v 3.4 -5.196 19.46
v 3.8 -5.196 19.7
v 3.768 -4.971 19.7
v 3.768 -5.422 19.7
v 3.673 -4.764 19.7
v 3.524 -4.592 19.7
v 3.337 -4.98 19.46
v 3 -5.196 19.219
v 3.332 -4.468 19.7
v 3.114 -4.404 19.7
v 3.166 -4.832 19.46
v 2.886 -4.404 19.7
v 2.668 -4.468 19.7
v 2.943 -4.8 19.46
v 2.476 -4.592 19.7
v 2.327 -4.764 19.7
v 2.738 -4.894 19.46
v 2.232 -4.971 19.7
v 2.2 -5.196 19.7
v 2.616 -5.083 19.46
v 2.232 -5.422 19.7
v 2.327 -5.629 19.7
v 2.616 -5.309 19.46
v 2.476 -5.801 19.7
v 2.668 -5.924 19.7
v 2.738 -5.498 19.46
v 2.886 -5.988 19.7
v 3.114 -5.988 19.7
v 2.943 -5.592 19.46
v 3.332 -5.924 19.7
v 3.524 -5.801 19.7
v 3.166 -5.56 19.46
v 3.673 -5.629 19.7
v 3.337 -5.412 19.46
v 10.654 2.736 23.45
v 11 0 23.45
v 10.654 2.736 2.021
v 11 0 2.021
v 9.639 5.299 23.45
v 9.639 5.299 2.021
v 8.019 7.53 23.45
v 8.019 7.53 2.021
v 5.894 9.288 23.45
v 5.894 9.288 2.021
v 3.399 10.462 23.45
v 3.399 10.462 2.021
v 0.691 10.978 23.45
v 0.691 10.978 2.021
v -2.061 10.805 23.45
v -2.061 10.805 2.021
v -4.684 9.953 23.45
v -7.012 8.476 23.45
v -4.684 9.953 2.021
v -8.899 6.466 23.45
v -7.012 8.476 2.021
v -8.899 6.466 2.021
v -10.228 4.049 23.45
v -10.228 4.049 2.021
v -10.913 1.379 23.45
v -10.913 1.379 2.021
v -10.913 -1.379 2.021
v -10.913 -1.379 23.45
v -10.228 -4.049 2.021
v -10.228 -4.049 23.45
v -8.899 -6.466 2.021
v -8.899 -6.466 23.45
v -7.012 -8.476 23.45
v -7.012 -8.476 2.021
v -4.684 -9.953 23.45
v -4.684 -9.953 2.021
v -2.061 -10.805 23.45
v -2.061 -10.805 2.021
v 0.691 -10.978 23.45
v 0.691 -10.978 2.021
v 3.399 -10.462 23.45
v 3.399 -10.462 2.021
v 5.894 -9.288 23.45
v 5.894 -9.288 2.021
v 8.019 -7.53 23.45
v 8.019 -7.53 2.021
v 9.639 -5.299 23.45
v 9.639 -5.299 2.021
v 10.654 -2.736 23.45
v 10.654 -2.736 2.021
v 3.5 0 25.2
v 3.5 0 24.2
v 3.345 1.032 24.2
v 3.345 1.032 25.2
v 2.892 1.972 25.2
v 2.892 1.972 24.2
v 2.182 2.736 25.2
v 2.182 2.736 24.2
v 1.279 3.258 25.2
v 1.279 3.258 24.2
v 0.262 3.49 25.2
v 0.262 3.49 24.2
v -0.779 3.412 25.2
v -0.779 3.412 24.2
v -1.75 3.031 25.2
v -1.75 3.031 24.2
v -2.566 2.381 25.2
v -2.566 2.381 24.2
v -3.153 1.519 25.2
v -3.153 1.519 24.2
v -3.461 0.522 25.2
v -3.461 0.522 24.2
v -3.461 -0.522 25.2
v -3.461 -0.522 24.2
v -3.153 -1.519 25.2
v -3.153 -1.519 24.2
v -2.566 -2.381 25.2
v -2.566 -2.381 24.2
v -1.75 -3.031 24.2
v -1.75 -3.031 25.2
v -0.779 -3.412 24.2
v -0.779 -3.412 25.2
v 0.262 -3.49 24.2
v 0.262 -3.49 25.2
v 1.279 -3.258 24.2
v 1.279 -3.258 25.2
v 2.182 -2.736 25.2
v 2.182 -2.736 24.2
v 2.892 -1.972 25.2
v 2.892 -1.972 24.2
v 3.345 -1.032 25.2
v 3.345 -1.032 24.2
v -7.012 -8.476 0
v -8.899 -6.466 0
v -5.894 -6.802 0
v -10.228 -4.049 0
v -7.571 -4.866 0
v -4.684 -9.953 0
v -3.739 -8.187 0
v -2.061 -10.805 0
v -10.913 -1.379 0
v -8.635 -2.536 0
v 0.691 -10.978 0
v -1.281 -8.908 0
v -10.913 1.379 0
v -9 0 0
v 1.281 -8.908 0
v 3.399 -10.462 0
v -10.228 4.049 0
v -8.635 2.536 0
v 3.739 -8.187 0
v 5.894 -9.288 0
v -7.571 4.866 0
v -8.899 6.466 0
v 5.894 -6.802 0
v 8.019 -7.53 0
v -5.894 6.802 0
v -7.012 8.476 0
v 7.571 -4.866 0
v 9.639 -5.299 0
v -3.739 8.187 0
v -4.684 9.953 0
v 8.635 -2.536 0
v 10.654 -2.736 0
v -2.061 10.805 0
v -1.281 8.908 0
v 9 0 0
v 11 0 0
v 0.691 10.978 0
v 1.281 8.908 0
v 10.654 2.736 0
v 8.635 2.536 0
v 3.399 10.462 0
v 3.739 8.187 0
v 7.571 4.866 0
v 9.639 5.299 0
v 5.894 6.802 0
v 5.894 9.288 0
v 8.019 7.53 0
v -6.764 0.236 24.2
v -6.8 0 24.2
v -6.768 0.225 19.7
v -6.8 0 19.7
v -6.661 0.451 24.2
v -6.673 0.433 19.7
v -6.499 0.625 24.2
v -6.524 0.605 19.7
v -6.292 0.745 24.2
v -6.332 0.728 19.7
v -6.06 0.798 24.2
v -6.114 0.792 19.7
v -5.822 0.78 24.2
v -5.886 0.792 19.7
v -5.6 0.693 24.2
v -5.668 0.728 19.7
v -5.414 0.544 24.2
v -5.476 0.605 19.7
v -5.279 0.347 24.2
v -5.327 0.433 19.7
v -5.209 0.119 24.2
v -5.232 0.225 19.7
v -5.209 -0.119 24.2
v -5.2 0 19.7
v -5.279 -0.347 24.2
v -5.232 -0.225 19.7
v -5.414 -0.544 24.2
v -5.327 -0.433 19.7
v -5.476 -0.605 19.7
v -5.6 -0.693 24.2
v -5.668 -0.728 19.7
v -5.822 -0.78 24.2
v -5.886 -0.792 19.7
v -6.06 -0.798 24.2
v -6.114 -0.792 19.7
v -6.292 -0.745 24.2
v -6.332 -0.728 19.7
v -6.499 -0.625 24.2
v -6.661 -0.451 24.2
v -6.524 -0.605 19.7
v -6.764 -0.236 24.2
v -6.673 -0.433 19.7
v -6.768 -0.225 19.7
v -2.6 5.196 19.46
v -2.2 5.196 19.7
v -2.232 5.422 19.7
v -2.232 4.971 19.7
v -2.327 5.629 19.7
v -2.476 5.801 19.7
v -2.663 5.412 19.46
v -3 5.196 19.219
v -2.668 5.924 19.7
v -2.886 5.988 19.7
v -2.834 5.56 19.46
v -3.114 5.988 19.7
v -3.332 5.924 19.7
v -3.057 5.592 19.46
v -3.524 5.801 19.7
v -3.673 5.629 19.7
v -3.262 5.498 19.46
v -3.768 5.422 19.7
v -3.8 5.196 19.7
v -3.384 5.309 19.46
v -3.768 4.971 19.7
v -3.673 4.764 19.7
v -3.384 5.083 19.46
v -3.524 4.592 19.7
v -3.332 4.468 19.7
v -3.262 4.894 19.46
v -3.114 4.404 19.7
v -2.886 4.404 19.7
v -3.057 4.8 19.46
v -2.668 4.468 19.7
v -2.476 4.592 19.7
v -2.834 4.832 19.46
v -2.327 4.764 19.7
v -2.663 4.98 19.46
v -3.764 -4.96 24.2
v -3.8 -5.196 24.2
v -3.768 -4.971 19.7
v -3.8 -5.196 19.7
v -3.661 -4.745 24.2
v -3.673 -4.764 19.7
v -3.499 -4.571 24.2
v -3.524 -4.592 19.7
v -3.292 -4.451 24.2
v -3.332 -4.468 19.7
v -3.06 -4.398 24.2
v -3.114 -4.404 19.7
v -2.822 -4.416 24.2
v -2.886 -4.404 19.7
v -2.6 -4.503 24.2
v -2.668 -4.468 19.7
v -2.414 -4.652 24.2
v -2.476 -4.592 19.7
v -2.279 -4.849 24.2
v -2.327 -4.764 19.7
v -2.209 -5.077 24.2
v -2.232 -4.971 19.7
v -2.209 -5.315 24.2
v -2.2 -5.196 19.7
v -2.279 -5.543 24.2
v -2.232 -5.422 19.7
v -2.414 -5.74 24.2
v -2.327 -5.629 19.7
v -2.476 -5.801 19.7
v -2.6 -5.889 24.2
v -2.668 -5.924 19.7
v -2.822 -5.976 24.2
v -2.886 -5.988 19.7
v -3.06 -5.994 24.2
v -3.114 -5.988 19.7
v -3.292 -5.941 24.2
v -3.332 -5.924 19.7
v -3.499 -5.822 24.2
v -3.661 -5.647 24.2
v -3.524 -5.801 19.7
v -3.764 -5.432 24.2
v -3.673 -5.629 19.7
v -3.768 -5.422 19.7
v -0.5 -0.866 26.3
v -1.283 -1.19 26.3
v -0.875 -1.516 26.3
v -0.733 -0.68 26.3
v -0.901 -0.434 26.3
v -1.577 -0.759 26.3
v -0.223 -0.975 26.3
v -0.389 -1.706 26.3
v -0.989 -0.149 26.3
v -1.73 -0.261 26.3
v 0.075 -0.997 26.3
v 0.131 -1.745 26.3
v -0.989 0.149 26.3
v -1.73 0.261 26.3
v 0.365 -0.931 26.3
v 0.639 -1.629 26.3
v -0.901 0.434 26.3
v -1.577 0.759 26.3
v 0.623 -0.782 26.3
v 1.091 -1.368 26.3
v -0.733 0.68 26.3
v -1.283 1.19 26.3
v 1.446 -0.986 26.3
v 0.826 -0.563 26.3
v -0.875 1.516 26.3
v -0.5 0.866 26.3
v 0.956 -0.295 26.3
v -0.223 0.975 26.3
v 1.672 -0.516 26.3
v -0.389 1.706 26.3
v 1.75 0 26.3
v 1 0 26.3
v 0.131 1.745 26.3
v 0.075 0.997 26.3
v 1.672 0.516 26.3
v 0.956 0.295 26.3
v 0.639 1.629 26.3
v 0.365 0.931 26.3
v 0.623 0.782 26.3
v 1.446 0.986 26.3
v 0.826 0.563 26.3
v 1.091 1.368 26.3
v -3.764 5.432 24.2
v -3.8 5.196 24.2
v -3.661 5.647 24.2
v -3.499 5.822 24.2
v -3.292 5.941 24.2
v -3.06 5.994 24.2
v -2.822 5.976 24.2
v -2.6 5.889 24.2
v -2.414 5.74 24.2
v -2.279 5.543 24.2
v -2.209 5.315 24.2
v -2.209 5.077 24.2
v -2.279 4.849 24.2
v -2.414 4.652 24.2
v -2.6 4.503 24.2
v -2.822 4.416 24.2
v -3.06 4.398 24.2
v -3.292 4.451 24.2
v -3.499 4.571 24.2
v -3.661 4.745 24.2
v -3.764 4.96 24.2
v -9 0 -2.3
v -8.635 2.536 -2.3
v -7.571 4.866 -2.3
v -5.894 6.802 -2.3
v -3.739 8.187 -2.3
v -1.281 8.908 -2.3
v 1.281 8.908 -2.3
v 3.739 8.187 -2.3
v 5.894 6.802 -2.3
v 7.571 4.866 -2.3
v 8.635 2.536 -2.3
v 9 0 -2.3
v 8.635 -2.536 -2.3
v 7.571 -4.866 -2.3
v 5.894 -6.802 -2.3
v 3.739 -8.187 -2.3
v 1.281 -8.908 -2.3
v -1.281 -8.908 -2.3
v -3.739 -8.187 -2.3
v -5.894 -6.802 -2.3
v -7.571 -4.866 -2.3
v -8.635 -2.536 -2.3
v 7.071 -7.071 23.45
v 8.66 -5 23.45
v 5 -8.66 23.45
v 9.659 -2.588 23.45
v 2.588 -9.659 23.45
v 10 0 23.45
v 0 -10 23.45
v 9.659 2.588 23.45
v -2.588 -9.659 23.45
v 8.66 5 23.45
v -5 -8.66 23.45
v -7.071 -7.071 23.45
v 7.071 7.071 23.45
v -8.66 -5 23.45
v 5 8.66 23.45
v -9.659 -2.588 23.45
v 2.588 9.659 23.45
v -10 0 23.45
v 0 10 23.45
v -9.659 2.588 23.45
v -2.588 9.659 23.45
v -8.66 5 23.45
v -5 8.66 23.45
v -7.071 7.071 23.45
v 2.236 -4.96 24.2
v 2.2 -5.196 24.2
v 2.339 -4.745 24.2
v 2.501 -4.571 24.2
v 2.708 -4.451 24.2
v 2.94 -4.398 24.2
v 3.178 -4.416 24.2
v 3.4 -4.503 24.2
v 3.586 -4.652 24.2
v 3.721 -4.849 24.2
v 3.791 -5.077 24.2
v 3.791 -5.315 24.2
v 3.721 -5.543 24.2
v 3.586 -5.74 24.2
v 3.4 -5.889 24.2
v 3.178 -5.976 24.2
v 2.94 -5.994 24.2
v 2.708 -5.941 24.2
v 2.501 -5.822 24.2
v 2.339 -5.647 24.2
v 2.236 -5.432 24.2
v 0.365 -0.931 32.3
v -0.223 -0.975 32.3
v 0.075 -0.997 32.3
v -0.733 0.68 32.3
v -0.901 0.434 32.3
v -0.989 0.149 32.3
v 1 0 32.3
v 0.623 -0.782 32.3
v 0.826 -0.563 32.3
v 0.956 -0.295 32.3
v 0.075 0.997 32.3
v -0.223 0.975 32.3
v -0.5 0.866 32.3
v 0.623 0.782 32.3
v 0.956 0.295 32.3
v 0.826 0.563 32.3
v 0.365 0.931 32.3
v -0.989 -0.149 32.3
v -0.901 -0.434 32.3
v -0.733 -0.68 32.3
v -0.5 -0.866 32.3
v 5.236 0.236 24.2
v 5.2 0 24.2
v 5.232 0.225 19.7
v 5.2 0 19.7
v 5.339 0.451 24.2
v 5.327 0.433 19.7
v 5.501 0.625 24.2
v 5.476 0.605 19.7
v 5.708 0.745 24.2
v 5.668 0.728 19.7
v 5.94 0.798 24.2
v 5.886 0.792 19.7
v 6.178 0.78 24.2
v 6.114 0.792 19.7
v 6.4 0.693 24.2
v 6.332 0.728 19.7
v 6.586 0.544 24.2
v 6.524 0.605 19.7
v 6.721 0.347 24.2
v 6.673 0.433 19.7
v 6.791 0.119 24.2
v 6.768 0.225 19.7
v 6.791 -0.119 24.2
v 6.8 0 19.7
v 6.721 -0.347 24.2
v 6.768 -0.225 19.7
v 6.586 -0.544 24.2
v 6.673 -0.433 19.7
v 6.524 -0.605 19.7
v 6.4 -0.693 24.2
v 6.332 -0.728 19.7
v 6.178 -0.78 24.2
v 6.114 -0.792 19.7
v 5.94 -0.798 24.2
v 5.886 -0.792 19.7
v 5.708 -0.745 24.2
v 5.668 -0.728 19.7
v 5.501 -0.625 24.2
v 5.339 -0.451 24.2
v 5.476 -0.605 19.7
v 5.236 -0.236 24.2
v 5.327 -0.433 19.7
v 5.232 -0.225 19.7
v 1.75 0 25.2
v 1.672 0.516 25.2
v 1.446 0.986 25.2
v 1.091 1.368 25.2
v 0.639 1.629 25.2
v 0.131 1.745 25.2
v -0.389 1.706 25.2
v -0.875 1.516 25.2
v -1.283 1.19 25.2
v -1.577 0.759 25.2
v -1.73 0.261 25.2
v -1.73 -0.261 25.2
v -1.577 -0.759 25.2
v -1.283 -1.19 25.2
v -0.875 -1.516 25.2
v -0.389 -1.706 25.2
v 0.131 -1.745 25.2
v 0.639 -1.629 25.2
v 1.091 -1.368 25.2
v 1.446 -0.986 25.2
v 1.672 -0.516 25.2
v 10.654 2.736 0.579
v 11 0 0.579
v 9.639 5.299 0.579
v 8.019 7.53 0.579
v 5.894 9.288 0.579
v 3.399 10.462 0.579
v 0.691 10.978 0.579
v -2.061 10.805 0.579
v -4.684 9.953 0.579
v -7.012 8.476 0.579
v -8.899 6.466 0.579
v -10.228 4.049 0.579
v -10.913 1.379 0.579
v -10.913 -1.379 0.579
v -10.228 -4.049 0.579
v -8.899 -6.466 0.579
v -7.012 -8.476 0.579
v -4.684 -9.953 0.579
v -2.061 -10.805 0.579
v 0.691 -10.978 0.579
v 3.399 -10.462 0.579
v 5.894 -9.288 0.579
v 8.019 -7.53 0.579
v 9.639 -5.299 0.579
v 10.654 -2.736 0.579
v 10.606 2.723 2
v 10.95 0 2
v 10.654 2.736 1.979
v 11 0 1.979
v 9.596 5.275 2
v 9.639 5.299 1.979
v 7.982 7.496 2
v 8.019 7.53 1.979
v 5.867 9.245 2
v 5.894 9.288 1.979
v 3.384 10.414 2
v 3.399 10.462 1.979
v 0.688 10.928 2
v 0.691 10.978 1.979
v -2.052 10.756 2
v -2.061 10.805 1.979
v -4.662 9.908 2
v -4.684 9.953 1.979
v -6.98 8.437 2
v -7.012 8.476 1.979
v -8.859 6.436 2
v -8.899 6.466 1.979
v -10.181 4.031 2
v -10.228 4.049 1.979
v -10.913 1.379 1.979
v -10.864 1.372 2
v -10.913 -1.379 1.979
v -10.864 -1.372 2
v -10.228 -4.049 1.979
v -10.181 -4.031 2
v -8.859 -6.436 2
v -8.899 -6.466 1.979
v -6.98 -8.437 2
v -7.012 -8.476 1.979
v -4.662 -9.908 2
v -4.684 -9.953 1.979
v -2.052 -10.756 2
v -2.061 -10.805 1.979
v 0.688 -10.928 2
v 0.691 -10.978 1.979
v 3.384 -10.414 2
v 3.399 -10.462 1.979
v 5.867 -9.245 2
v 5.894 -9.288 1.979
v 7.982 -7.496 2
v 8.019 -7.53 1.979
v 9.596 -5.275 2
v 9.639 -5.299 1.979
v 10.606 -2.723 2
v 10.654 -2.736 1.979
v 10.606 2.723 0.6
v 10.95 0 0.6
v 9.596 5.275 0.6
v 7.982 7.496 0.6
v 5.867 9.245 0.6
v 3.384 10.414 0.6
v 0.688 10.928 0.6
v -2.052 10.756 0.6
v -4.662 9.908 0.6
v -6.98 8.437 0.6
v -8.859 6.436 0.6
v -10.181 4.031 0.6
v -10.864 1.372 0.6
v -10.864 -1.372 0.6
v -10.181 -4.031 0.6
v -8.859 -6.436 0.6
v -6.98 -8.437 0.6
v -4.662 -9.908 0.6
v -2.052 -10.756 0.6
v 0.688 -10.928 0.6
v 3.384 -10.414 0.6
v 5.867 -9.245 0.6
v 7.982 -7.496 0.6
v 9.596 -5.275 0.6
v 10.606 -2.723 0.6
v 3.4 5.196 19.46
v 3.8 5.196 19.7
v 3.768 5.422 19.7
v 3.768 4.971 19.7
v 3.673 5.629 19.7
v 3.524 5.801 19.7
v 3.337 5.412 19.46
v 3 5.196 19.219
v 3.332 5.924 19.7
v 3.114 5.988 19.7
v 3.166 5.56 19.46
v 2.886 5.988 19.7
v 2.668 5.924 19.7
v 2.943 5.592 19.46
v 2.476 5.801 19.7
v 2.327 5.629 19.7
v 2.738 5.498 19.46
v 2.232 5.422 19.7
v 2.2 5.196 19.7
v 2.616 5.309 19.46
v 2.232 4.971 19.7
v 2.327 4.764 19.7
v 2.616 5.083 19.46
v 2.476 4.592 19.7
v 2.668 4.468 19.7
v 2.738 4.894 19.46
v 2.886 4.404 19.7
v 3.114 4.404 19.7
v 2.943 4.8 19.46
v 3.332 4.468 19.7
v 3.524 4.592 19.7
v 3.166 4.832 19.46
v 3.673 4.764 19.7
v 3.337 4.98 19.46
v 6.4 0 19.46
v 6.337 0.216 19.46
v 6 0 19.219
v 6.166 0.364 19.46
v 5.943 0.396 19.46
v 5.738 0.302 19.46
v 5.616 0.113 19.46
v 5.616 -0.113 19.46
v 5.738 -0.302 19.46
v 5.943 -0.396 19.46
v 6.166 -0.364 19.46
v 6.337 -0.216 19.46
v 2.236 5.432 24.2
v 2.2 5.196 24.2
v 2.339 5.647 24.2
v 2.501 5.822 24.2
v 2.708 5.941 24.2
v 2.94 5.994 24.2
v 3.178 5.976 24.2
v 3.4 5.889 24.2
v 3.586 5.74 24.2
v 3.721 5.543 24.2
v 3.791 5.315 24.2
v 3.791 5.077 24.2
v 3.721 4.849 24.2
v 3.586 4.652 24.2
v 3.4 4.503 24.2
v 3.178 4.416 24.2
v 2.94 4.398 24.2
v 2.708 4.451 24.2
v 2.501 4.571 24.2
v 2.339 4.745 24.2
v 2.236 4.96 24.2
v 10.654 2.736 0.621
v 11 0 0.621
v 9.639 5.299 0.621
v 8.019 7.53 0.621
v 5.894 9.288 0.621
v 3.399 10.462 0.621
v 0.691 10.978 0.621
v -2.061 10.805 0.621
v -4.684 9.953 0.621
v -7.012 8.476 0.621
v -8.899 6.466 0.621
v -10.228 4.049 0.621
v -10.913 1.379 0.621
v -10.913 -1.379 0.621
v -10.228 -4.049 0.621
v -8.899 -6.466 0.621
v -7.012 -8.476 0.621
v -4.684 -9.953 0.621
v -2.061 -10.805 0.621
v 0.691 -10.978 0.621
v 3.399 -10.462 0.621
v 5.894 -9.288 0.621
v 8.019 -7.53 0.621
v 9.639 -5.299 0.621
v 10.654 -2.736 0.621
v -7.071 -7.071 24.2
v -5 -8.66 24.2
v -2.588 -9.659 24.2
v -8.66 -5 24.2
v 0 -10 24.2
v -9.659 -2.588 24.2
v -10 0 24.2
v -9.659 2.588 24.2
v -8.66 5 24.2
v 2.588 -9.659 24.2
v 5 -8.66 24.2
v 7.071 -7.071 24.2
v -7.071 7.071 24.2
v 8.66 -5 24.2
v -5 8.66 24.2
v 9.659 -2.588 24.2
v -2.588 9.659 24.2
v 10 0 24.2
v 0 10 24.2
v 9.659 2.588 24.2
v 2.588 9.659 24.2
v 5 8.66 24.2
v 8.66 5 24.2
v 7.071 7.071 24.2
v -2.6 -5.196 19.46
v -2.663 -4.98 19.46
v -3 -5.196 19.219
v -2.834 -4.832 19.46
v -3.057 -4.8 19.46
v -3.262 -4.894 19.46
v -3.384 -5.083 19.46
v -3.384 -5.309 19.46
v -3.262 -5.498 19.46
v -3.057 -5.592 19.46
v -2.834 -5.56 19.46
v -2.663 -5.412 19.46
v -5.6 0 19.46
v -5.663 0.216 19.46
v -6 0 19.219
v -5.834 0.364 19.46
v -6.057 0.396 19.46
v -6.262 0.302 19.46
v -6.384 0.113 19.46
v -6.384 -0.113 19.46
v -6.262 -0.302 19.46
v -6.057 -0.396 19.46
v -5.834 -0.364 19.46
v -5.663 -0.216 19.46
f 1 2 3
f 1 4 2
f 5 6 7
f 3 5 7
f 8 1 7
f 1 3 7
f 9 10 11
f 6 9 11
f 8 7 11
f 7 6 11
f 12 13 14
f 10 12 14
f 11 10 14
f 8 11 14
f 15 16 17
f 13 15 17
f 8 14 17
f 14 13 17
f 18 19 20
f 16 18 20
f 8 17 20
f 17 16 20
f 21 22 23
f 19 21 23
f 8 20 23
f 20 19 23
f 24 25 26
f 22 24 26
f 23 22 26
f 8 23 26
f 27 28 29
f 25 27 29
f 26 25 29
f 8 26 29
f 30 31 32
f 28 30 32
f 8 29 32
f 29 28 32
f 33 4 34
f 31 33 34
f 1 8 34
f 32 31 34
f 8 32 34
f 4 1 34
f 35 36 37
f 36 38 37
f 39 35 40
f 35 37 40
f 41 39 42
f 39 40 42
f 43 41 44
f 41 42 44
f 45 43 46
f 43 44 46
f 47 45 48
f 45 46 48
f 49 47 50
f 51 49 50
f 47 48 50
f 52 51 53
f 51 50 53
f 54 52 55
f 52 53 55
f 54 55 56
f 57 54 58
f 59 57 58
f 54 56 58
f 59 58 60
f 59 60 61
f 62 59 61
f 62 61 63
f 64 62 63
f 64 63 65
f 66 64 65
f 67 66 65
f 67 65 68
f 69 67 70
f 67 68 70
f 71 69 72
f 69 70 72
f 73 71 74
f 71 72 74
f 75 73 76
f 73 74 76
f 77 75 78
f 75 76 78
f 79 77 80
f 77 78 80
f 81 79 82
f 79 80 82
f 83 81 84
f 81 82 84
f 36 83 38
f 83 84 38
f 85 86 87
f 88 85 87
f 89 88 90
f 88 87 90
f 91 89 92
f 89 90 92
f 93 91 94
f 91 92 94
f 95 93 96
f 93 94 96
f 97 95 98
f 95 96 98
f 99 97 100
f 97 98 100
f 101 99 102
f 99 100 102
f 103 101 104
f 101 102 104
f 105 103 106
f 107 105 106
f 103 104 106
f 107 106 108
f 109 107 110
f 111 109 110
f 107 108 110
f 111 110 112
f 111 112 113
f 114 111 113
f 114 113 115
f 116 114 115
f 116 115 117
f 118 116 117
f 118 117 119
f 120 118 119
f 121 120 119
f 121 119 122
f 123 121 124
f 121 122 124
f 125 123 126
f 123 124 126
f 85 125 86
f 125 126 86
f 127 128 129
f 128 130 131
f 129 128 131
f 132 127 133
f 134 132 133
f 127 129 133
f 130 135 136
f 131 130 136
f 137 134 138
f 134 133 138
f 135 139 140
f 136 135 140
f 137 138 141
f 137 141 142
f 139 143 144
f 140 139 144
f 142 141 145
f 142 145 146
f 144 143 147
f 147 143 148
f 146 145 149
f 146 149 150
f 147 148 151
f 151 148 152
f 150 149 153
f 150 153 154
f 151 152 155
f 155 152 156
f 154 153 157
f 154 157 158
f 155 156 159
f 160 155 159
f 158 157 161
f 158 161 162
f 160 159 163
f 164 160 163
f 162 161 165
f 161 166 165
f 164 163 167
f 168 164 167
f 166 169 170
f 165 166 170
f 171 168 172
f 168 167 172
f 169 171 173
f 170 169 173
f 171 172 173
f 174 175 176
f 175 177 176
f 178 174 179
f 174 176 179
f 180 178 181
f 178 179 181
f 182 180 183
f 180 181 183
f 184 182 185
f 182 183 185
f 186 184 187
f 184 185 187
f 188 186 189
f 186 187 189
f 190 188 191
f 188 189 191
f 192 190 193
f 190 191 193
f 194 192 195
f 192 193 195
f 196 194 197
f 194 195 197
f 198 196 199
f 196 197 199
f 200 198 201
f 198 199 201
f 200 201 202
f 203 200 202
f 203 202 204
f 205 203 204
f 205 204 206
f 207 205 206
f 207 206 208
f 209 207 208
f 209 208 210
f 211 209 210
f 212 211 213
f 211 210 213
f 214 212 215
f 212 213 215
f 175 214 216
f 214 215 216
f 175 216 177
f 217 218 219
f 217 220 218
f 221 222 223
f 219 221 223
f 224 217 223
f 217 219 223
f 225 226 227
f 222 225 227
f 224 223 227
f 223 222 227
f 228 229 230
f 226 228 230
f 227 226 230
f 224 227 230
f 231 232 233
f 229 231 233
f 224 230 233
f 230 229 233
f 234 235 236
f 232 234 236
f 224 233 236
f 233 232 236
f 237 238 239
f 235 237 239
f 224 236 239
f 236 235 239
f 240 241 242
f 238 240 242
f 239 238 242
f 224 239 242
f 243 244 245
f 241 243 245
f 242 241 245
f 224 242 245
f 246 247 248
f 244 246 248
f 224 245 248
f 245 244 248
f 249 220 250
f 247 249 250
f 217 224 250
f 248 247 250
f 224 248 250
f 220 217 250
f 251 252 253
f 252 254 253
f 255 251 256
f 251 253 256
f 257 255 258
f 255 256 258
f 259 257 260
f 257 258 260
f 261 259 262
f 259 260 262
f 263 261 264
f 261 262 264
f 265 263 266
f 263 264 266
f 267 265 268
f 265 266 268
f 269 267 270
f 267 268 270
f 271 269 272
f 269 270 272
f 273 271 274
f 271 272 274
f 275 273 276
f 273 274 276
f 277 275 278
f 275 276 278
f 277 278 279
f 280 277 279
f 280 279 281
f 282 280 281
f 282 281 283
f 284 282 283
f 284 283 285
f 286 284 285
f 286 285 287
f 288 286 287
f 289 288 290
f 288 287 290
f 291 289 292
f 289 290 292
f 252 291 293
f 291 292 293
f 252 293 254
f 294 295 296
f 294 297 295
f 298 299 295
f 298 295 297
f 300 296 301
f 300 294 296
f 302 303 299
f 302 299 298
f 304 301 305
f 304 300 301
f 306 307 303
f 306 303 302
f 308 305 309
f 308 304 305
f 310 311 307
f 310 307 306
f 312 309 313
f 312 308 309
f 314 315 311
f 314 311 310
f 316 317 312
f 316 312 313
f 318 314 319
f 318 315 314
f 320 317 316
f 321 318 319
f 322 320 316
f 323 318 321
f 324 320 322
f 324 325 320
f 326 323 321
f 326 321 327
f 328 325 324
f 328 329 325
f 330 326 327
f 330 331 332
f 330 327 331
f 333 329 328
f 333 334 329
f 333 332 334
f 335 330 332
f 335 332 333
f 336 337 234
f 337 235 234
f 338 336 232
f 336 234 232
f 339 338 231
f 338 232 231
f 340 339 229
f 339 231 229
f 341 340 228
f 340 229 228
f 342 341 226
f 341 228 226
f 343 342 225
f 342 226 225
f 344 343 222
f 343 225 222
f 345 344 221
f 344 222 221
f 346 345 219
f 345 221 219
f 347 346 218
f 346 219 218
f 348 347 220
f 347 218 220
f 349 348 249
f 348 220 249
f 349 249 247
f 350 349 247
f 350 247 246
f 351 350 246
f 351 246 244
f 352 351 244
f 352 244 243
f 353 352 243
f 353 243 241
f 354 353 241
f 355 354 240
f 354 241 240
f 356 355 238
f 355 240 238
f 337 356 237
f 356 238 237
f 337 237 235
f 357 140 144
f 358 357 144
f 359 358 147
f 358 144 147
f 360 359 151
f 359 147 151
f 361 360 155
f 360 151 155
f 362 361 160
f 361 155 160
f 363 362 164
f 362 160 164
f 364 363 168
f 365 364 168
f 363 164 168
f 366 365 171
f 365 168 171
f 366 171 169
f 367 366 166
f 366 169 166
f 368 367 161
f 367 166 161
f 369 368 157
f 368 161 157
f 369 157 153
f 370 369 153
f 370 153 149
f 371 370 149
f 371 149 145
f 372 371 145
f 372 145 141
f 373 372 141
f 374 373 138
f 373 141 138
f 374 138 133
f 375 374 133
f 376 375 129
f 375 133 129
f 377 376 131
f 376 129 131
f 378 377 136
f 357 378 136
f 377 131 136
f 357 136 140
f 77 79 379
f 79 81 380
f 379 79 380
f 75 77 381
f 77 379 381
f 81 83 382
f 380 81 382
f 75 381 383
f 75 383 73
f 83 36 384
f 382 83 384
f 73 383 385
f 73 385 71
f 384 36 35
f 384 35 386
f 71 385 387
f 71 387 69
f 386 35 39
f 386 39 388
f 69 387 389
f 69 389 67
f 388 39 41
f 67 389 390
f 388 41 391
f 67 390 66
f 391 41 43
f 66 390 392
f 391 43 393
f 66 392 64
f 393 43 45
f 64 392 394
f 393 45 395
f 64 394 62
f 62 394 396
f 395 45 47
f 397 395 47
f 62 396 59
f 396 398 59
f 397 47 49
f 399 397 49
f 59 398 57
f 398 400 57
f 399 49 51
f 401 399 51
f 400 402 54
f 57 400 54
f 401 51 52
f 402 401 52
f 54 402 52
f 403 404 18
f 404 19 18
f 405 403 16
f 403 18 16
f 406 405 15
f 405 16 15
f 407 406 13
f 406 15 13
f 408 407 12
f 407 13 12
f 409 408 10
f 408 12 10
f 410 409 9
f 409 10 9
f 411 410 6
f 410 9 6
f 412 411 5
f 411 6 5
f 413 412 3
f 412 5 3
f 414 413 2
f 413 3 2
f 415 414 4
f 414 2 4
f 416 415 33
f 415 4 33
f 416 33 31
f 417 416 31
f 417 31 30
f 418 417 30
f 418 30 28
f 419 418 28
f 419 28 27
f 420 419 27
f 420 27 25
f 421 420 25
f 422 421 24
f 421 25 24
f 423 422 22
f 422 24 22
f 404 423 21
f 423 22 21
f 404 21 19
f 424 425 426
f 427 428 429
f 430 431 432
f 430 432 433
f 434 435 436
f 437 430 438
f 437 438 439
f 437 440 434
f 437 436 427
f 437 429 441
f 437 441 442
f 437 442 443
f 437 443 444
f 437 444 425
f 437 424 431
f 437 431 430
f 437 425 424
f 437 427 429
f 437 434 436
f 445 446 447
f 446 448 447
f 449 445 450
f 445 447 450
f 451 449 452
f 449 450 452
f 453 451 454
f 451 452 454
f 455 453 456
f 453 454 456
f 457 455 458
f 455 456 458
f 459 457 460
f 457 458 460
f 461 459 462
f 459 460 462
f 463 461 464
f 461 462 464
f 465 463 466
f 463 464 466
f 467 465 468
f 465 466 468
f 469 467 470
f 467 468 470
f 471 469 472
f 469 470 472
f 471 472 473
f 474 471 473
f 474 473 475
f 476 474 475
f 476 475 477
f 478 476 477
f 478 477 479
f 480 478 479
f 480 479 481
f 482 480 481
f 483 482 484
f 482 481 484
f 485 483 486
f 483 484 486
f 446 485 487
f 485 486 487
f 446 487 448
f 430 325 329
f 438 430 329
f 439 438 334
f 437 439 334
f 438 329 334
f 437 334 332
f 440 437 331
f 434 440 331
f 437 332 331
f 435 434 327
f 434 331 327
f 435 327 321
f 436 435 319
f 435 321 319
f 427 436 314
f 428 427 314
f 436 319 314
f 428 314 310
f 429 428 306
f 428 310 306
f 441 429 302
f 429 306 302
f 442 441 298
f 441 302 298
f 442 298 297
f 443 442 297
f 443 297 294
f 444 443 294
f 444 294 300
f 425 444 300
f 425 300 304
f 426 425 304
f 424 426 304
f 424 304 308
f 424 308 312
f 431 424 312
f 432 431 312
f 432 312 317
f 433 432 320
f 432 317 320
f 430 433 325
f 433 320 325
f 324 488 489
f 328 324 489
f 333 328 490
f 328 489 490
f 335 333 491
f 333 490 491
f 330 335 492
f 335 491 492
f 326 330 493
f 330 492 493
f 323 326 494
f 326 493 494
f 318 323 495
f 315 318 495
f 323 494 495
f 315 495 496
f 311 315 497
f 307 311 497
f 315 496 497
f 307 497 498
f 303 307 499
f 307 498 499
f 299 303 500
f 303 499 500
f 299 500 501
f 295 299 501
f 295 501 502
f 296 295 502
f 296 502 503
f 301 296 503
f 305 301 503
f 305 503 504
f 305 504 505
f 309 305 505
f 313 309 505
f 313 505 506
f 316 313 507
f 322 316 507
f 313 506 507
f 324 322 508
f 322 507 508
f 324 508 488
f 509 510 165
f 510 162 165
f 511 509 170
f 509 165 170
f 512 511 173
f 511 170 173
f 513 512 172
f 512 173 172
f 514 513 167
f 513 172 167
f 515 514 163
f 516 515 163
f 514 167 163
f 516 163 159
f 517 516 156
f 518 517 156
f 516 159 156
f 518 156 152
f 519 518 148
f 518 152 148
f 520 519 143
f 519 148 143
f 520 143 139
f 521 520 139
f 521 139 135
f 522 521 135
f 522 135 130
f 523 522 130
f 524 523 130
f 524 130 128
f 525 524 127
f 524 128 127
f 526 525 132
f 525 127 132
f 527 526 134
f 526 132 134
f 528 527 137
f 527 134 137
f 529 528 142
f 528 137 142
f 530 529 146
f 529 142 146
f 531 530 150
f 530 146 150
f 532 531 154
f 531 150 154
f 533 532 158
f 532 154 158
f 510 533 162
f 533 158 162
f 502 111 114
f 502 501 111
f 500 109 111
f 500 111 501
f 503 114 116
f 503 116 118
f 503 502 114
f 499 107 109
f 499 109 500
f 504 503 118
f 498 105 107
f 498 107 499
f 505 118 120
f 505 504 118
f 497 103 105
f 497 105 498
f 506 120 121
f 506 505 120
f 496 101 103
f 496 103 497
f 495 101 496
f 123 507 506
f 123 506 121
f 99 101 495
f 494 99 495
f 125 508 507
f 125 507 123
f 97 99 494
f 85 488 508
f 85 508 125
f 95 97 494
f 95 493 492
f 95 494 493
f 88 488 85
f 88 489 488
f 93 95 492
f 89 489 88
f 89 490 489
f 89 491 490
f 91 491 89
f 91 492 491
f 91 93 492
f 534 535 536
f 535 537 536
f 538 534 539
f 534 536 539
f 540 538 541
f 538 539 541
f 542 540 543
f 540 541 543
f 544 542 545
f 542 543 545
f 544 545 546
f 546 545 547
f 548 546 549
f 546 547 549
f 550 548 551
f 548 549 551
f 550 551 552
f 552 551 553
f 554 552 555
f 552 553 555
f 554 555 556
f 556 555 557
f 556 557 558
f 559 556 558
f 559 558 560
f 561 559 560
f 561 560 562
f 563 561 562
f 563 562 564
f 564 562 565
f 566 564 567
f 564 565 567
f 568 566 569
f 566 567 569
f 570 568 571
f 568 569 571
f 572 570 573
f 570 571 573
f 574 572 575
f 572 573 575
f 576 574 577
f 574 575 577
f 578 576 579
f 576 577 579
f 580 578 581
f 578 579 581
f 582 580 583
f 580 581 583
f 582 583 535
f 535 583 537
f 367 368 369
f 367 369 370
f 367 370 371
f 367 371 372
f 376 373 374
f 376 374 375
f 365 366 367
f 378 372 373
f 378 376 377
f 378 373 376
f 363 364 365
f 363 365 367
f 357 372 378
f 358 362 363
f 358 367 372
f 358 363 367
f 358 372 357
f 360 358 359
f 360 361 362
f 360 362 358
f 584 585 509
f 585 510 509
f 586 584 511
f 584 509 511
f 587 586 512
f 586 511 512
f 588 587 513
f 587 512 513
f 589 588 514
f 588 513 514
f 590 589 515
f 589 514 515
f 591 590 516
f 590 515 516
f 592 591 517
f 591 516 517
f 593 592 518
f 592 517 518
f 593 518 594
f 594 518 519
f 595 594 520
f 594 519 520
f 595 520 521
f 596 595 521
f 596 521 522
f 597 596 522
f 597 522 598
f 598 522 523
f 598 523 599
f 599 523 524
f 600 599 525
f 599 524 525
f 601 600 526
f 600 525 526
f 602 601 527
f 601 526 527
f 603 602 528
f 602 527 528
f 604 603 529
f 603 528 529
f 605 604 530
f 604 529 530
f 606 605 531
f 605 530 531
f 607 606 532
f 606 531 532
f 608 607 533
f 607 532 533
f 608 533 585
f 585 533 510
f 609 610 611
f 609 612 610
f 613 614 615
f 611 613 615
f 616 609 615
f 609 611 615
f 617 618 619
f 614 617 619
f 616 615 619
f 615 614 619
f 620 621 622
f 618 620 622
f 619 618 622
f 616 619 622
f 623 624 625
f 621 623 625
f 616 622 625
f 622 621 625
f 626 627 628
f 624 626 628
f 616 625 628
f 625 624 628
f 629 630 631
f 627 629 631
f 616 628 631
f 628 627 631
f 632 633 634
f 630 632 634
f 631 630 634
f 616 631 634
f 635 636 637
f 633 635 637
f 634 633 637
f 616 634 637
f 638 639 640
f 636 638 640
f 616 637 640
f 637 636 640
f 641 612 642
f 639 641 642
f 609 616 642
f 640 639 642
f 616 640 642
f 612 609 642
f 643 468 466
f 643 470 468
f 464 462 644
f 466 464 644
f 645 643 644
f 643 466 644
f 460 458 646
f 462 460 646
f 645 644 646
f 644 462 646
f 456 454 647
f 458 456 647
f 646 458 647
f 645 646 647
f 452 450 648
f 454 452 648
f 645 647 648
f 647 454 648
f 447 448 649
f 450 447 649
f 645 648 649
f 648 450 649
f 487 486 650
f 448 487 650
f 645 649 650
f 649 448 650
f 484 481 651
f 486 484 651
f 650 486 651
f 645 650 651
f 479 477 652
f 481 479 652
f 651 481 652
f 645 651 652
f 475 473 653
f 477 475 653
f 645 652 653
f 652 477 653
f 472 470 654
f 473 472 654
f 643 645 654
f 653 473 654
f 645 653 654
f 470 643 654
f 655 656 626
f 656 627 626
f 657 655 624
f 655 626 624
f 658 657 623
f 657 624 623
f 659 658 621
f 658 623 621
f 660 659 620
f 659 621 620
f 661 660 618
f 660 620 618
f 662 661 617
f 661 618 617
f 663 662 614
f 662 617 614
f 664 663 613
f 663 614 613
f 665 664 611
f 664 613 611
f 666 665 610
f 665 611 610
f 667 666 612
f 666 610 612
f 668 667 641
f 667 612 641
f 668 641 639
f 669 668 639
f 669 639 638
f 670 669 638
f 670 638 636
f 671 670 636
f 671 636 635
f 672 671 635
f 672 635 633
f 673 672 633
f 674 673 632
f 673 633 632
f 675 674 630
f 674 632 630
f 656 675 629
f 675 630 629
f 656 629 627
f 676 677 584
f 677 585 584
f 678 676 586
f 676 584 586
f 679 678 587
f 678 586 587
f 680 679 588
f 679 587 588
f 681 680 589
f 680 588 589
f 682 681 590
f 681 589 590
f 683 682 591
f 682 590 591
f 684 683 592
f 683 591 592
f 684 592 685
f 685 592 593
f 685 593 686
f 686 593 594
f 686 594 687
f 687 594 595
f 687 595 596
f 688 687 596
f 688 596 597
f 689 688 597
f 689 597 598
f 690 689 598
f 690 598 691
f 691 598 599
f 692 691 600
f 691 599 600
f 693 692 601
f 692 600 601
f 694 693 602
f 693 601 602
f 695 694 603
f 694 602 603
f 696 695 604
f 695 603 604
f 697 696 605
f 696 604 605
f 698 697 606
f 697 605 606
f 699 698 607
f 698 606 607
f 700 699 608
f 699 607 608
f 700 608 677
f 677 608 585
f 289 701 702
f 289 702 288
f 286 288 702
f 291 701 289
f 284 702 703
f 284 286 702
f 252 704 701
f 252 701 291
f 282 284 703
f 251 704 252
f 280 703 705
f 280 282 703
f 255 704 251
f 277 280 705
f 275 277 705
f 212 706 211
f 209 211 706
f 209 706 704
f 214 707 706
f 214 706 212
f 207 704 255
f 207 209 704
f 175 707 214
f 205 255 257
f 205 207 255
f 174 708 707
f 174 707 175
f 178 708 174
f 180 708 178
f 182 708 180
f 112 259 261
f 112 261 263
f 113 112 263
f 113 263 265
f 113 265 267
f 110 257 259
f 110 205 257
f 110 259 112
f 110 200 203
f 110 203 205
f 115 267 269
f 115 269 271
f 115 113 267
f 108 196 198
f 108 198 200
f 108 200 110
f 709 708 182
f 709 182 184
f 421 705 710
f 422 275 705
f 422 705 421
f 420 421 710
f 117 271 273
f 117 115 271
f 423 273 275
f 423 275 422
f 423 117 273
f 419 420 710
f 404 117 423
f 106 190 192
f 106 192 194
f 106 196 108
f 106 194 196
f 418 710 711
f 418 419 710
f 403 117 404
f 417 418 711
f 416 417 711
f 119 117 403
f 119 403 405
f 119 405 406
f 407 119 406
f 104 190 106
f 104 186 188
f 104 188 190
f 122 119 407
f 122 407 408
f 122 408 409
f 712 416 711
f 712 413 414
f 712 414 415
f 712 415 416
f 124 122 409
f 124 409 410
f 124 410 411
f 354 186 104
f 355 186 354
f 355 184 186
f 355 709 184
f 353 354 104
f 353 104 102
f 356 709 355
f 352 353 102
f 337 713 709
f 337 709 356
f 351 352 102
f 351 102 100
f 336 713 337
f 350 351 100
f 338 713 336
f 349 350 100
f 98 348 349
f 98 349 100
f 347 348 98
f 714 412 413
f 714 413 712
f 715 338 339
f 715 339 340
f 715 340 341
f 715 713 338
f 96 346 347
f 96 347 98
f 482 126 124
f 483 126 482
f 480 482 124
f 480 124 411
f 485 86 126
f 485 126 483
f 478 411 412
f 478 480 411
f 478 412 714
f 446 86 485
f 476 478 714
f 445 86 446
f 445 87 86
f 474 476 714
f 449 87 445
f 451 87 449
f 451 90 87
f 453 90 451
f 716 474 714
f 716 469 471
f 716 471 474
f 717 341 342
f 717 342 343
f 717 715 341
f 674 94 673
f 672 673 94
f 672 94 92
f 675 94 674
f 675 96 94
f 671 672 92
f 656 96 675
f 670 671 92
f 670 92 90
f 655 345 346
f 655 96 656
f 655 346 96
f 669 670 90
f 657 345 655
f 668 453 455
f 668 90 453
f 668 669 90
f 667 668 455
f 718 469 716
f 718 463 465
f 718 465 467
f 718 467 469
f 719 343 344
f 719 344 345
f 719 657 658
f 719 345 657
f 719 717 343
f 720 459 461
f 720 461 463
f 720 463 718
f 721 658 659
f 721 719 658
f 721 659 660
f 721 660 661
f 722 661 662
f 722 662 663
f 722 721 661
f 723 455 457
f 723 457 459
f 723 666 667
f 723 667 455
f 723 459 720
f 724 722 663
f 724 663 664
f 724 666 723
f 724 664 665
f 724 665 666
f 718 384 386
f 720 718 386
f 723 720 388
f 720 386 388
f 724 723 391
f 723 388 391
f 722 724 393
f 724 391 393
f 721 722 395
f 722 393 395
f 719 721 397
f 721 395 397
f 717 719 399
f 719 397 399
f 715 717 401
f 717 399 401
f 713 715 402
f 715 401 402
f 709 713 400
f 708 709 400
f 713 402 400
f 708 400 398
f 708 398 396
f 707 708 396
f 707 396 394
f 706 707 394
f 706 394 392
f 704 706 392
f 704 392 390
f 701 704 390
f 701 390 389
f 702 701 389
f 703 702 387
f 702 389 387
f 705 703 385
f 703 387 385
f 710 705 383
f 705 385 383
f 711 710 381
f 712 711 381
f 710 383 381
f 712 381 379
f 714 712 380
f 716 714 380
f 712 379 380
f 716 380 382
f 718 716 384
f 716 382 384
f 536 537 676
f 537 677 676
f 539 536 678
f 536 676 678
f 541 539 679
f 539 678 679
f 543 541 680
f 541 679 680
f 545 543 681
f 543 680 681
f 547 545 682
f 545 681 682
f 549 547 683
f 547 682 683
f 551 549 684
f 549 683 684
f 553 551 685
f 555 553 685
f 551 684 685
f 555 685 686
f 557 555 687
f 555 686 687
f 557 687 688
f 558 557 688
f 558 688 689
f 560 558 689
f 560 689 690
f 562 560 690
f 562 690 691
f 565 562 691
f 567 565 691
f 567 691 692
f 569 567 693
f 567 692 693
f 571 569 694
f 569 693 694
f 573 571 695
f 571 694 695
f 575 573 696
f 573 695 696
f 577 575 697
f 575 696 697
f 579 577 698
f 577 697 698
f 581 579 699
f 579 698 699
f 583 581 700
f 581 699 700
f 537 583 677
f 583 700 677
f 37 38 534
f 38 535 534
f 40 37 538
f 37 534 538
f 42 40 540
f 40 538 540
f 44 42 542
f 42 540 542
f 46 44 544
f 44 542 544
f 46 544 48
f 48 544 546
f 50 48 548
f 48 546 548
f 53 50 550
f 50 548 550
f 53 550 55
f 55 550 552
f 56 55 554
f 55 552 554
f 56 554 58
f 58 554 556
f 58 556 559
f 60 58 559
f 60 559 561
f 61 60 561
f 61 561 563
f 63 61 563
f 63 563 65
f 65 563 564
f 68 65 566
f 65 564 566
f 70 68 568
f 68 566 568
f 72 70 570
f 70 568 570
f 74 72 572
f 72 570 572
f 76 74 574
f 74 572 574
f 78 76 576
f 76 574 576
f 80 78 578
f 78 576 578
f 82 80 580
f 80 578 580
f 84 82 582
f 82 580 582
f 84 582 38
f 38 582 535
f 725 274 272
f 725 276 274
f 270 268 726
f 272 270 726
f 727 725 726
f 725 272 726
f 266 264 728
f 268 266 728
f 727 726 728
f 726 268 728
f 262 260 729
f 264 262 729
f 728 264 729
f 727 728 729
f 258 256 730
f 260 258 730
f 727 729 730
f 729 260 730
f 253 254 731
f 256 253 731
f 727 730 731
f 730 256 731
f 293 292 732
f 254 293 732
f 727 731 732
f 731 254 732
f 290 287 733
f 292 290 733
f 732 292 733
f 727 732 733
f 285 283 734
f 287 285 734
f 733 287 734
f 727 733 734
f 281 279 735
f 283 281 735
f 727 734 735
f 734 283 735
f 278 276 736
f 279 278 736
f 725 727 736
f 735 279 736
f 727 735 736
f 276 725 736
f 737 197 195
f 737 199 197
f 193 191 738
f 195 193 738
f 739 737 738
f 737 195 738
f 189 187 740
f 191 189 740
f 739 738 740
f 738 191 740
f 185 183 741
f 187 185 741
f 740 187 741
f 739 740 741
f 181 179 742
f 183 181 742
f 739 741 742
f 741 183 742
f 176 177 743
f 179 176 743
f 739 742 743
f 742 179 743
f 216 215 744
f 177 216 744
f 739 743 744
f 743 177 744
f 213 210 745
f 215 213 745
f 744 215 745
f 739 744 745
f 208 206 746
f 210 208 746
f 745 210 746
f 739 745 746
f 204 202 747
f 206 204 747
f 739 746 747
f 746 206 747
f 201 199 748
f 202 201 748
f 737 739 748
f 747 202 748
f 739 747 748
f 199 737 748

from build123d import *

# Parameters (mm, degrees)
BOSS_EXTRUDE3_DEPTH            = 1
SKETCH7_R                      = 10
BOSS_EXTRUDE4_DEPTH            = 0.75
SKETCH8_R                      = 3.5
BOSS_EXTRUDE5_DEPTH            = 1
SKETCH9_R                      = 1.75
BOSS_EXTRUDE6_DEPTH            = 1.1
SKETCH10_R                     = 1
BOSS_EXTRUDE7_DEPTH            = 6
F_1_6_1_6_DIAMETER_HOLE1_D     = 1.6
F_1_6_1_6_DIAMETER_HOLE1_DEPTH = 4.5
F_1_6_1_6_DIAMETER_HOLE1_TIP   = 0.480688495
SKETCH13_R                     = 9
BOSS_EXTRUDE8_DEPTH            = 2.3


with BuildPart() as part:
    # Sketch1 → Revolve1 (revolve)
    with BuildSketch(Plane(origin=(0, 0, 0), x_dir=(1, 0, 0), z_dir=(0, 1, 0))):
        Polygon((11, 0), (0, 0), (0, -23.45), (11, -23.45), (11, -2.020710678), (10.95, -2), (11, -1.979289322), (11, -0.620710678), (10.95, -0.6), (11, -0.579289322), align=None)
    revolve(axis=Axis((0, 0, 0), (0, 0, 1)))

    # Sketch6 → Boss-Extrude3 (add)
    with BuildSketch(Plane(origin=(0, 0, 0), x_dir=(-1, 0, 0), z_dir=(0, 0, -1))):
        with BuildLine():
            Line((5.05, 5.477225575), (5.05, -5.477225575))
            ThreePointArc((5.05, -5.477225575), (0, -7.45), (-5.05, -5.477225575))
            Line((-5.05, -5.477225575), (-5.05, 5.477225575))
            ThreePointArc((-5.05, 5.477225575), (0, 7.45), (5.05, 5.477225575))
        make_face()
    extrude(amount=BOSS_EXTRUDE3_DEPTH)

    # Sketch7 → Boss-Extrude4 (add)
    with BuildSketch(Plane.XY.offset(23.45)):
        Circle(SKETCH7_R)
    extrude(amount=BOSS_EXTRUDE4_DEPTH)

    # Sketch8 → Boss-Extrude5 (add)
    with BuildSketch(Plane.XY.offset(24.2)):
        Circle(SKETCH8_R)
    extrude(amount=BOSS_EXTRUDE5_DEPTH)

    # Sketch9 → Boss-Extrude6 (add)
    with BuildSketch(Plane.XY.offset(25.2)):
        Circle(SKETCH9_R)
    extrude(amount=BOSS_EXTRUDE6_DEPTH)

    # Sketch10 → Boss-Extrude7 (add)
    with BuildSketch(Plane.XY.offset(26.3)):
        Circle(SKETCH10_R)
    extrude(amount=BOSS_EXTRUDE7_DEPTH)

    # Ø1.6 (1.6) Diameter Hole1
    with Locations(Plane.XY.offset(24.2)):
        with Locations((-3, 5.196152423), (3, 5.196152423), (6, 0), (3, -5.196152423), (-3, -5.196152423), (-6, 0)):
            Hole(F_1_6_1_6_DIAMETER_HOLE1_D / 2, depth=F_1_6_1_6_DIAMETER_HOLE1_DEPTH)
            with Locations((0, 0, -(F_1_6_1_6_DIAMETER_HOLE1_DEPTH + F_1_6_1_6_DIAMETER_HOLE1_TIP / 2))):  # 118° drill point
                Cone(0, F_1_6_1_6_DIAMETER_HOLE1_D / 2, F_1_6_1_6_DIAMETER_HOLE1_TIP, mode=Mode.SUBTRACT)

    # Sketch13 → Boss-Extrude8 (add)
    with BuildSketch(Plane(origin=(0, 0, 0), x_dir=(-1, 0, 0), z_dir=(0, 0, -1))):
        Circle(SKETCH13_R)
    extrude(amount=BOSS_EXTRUDE8_DEPTH)


solid = part.part
